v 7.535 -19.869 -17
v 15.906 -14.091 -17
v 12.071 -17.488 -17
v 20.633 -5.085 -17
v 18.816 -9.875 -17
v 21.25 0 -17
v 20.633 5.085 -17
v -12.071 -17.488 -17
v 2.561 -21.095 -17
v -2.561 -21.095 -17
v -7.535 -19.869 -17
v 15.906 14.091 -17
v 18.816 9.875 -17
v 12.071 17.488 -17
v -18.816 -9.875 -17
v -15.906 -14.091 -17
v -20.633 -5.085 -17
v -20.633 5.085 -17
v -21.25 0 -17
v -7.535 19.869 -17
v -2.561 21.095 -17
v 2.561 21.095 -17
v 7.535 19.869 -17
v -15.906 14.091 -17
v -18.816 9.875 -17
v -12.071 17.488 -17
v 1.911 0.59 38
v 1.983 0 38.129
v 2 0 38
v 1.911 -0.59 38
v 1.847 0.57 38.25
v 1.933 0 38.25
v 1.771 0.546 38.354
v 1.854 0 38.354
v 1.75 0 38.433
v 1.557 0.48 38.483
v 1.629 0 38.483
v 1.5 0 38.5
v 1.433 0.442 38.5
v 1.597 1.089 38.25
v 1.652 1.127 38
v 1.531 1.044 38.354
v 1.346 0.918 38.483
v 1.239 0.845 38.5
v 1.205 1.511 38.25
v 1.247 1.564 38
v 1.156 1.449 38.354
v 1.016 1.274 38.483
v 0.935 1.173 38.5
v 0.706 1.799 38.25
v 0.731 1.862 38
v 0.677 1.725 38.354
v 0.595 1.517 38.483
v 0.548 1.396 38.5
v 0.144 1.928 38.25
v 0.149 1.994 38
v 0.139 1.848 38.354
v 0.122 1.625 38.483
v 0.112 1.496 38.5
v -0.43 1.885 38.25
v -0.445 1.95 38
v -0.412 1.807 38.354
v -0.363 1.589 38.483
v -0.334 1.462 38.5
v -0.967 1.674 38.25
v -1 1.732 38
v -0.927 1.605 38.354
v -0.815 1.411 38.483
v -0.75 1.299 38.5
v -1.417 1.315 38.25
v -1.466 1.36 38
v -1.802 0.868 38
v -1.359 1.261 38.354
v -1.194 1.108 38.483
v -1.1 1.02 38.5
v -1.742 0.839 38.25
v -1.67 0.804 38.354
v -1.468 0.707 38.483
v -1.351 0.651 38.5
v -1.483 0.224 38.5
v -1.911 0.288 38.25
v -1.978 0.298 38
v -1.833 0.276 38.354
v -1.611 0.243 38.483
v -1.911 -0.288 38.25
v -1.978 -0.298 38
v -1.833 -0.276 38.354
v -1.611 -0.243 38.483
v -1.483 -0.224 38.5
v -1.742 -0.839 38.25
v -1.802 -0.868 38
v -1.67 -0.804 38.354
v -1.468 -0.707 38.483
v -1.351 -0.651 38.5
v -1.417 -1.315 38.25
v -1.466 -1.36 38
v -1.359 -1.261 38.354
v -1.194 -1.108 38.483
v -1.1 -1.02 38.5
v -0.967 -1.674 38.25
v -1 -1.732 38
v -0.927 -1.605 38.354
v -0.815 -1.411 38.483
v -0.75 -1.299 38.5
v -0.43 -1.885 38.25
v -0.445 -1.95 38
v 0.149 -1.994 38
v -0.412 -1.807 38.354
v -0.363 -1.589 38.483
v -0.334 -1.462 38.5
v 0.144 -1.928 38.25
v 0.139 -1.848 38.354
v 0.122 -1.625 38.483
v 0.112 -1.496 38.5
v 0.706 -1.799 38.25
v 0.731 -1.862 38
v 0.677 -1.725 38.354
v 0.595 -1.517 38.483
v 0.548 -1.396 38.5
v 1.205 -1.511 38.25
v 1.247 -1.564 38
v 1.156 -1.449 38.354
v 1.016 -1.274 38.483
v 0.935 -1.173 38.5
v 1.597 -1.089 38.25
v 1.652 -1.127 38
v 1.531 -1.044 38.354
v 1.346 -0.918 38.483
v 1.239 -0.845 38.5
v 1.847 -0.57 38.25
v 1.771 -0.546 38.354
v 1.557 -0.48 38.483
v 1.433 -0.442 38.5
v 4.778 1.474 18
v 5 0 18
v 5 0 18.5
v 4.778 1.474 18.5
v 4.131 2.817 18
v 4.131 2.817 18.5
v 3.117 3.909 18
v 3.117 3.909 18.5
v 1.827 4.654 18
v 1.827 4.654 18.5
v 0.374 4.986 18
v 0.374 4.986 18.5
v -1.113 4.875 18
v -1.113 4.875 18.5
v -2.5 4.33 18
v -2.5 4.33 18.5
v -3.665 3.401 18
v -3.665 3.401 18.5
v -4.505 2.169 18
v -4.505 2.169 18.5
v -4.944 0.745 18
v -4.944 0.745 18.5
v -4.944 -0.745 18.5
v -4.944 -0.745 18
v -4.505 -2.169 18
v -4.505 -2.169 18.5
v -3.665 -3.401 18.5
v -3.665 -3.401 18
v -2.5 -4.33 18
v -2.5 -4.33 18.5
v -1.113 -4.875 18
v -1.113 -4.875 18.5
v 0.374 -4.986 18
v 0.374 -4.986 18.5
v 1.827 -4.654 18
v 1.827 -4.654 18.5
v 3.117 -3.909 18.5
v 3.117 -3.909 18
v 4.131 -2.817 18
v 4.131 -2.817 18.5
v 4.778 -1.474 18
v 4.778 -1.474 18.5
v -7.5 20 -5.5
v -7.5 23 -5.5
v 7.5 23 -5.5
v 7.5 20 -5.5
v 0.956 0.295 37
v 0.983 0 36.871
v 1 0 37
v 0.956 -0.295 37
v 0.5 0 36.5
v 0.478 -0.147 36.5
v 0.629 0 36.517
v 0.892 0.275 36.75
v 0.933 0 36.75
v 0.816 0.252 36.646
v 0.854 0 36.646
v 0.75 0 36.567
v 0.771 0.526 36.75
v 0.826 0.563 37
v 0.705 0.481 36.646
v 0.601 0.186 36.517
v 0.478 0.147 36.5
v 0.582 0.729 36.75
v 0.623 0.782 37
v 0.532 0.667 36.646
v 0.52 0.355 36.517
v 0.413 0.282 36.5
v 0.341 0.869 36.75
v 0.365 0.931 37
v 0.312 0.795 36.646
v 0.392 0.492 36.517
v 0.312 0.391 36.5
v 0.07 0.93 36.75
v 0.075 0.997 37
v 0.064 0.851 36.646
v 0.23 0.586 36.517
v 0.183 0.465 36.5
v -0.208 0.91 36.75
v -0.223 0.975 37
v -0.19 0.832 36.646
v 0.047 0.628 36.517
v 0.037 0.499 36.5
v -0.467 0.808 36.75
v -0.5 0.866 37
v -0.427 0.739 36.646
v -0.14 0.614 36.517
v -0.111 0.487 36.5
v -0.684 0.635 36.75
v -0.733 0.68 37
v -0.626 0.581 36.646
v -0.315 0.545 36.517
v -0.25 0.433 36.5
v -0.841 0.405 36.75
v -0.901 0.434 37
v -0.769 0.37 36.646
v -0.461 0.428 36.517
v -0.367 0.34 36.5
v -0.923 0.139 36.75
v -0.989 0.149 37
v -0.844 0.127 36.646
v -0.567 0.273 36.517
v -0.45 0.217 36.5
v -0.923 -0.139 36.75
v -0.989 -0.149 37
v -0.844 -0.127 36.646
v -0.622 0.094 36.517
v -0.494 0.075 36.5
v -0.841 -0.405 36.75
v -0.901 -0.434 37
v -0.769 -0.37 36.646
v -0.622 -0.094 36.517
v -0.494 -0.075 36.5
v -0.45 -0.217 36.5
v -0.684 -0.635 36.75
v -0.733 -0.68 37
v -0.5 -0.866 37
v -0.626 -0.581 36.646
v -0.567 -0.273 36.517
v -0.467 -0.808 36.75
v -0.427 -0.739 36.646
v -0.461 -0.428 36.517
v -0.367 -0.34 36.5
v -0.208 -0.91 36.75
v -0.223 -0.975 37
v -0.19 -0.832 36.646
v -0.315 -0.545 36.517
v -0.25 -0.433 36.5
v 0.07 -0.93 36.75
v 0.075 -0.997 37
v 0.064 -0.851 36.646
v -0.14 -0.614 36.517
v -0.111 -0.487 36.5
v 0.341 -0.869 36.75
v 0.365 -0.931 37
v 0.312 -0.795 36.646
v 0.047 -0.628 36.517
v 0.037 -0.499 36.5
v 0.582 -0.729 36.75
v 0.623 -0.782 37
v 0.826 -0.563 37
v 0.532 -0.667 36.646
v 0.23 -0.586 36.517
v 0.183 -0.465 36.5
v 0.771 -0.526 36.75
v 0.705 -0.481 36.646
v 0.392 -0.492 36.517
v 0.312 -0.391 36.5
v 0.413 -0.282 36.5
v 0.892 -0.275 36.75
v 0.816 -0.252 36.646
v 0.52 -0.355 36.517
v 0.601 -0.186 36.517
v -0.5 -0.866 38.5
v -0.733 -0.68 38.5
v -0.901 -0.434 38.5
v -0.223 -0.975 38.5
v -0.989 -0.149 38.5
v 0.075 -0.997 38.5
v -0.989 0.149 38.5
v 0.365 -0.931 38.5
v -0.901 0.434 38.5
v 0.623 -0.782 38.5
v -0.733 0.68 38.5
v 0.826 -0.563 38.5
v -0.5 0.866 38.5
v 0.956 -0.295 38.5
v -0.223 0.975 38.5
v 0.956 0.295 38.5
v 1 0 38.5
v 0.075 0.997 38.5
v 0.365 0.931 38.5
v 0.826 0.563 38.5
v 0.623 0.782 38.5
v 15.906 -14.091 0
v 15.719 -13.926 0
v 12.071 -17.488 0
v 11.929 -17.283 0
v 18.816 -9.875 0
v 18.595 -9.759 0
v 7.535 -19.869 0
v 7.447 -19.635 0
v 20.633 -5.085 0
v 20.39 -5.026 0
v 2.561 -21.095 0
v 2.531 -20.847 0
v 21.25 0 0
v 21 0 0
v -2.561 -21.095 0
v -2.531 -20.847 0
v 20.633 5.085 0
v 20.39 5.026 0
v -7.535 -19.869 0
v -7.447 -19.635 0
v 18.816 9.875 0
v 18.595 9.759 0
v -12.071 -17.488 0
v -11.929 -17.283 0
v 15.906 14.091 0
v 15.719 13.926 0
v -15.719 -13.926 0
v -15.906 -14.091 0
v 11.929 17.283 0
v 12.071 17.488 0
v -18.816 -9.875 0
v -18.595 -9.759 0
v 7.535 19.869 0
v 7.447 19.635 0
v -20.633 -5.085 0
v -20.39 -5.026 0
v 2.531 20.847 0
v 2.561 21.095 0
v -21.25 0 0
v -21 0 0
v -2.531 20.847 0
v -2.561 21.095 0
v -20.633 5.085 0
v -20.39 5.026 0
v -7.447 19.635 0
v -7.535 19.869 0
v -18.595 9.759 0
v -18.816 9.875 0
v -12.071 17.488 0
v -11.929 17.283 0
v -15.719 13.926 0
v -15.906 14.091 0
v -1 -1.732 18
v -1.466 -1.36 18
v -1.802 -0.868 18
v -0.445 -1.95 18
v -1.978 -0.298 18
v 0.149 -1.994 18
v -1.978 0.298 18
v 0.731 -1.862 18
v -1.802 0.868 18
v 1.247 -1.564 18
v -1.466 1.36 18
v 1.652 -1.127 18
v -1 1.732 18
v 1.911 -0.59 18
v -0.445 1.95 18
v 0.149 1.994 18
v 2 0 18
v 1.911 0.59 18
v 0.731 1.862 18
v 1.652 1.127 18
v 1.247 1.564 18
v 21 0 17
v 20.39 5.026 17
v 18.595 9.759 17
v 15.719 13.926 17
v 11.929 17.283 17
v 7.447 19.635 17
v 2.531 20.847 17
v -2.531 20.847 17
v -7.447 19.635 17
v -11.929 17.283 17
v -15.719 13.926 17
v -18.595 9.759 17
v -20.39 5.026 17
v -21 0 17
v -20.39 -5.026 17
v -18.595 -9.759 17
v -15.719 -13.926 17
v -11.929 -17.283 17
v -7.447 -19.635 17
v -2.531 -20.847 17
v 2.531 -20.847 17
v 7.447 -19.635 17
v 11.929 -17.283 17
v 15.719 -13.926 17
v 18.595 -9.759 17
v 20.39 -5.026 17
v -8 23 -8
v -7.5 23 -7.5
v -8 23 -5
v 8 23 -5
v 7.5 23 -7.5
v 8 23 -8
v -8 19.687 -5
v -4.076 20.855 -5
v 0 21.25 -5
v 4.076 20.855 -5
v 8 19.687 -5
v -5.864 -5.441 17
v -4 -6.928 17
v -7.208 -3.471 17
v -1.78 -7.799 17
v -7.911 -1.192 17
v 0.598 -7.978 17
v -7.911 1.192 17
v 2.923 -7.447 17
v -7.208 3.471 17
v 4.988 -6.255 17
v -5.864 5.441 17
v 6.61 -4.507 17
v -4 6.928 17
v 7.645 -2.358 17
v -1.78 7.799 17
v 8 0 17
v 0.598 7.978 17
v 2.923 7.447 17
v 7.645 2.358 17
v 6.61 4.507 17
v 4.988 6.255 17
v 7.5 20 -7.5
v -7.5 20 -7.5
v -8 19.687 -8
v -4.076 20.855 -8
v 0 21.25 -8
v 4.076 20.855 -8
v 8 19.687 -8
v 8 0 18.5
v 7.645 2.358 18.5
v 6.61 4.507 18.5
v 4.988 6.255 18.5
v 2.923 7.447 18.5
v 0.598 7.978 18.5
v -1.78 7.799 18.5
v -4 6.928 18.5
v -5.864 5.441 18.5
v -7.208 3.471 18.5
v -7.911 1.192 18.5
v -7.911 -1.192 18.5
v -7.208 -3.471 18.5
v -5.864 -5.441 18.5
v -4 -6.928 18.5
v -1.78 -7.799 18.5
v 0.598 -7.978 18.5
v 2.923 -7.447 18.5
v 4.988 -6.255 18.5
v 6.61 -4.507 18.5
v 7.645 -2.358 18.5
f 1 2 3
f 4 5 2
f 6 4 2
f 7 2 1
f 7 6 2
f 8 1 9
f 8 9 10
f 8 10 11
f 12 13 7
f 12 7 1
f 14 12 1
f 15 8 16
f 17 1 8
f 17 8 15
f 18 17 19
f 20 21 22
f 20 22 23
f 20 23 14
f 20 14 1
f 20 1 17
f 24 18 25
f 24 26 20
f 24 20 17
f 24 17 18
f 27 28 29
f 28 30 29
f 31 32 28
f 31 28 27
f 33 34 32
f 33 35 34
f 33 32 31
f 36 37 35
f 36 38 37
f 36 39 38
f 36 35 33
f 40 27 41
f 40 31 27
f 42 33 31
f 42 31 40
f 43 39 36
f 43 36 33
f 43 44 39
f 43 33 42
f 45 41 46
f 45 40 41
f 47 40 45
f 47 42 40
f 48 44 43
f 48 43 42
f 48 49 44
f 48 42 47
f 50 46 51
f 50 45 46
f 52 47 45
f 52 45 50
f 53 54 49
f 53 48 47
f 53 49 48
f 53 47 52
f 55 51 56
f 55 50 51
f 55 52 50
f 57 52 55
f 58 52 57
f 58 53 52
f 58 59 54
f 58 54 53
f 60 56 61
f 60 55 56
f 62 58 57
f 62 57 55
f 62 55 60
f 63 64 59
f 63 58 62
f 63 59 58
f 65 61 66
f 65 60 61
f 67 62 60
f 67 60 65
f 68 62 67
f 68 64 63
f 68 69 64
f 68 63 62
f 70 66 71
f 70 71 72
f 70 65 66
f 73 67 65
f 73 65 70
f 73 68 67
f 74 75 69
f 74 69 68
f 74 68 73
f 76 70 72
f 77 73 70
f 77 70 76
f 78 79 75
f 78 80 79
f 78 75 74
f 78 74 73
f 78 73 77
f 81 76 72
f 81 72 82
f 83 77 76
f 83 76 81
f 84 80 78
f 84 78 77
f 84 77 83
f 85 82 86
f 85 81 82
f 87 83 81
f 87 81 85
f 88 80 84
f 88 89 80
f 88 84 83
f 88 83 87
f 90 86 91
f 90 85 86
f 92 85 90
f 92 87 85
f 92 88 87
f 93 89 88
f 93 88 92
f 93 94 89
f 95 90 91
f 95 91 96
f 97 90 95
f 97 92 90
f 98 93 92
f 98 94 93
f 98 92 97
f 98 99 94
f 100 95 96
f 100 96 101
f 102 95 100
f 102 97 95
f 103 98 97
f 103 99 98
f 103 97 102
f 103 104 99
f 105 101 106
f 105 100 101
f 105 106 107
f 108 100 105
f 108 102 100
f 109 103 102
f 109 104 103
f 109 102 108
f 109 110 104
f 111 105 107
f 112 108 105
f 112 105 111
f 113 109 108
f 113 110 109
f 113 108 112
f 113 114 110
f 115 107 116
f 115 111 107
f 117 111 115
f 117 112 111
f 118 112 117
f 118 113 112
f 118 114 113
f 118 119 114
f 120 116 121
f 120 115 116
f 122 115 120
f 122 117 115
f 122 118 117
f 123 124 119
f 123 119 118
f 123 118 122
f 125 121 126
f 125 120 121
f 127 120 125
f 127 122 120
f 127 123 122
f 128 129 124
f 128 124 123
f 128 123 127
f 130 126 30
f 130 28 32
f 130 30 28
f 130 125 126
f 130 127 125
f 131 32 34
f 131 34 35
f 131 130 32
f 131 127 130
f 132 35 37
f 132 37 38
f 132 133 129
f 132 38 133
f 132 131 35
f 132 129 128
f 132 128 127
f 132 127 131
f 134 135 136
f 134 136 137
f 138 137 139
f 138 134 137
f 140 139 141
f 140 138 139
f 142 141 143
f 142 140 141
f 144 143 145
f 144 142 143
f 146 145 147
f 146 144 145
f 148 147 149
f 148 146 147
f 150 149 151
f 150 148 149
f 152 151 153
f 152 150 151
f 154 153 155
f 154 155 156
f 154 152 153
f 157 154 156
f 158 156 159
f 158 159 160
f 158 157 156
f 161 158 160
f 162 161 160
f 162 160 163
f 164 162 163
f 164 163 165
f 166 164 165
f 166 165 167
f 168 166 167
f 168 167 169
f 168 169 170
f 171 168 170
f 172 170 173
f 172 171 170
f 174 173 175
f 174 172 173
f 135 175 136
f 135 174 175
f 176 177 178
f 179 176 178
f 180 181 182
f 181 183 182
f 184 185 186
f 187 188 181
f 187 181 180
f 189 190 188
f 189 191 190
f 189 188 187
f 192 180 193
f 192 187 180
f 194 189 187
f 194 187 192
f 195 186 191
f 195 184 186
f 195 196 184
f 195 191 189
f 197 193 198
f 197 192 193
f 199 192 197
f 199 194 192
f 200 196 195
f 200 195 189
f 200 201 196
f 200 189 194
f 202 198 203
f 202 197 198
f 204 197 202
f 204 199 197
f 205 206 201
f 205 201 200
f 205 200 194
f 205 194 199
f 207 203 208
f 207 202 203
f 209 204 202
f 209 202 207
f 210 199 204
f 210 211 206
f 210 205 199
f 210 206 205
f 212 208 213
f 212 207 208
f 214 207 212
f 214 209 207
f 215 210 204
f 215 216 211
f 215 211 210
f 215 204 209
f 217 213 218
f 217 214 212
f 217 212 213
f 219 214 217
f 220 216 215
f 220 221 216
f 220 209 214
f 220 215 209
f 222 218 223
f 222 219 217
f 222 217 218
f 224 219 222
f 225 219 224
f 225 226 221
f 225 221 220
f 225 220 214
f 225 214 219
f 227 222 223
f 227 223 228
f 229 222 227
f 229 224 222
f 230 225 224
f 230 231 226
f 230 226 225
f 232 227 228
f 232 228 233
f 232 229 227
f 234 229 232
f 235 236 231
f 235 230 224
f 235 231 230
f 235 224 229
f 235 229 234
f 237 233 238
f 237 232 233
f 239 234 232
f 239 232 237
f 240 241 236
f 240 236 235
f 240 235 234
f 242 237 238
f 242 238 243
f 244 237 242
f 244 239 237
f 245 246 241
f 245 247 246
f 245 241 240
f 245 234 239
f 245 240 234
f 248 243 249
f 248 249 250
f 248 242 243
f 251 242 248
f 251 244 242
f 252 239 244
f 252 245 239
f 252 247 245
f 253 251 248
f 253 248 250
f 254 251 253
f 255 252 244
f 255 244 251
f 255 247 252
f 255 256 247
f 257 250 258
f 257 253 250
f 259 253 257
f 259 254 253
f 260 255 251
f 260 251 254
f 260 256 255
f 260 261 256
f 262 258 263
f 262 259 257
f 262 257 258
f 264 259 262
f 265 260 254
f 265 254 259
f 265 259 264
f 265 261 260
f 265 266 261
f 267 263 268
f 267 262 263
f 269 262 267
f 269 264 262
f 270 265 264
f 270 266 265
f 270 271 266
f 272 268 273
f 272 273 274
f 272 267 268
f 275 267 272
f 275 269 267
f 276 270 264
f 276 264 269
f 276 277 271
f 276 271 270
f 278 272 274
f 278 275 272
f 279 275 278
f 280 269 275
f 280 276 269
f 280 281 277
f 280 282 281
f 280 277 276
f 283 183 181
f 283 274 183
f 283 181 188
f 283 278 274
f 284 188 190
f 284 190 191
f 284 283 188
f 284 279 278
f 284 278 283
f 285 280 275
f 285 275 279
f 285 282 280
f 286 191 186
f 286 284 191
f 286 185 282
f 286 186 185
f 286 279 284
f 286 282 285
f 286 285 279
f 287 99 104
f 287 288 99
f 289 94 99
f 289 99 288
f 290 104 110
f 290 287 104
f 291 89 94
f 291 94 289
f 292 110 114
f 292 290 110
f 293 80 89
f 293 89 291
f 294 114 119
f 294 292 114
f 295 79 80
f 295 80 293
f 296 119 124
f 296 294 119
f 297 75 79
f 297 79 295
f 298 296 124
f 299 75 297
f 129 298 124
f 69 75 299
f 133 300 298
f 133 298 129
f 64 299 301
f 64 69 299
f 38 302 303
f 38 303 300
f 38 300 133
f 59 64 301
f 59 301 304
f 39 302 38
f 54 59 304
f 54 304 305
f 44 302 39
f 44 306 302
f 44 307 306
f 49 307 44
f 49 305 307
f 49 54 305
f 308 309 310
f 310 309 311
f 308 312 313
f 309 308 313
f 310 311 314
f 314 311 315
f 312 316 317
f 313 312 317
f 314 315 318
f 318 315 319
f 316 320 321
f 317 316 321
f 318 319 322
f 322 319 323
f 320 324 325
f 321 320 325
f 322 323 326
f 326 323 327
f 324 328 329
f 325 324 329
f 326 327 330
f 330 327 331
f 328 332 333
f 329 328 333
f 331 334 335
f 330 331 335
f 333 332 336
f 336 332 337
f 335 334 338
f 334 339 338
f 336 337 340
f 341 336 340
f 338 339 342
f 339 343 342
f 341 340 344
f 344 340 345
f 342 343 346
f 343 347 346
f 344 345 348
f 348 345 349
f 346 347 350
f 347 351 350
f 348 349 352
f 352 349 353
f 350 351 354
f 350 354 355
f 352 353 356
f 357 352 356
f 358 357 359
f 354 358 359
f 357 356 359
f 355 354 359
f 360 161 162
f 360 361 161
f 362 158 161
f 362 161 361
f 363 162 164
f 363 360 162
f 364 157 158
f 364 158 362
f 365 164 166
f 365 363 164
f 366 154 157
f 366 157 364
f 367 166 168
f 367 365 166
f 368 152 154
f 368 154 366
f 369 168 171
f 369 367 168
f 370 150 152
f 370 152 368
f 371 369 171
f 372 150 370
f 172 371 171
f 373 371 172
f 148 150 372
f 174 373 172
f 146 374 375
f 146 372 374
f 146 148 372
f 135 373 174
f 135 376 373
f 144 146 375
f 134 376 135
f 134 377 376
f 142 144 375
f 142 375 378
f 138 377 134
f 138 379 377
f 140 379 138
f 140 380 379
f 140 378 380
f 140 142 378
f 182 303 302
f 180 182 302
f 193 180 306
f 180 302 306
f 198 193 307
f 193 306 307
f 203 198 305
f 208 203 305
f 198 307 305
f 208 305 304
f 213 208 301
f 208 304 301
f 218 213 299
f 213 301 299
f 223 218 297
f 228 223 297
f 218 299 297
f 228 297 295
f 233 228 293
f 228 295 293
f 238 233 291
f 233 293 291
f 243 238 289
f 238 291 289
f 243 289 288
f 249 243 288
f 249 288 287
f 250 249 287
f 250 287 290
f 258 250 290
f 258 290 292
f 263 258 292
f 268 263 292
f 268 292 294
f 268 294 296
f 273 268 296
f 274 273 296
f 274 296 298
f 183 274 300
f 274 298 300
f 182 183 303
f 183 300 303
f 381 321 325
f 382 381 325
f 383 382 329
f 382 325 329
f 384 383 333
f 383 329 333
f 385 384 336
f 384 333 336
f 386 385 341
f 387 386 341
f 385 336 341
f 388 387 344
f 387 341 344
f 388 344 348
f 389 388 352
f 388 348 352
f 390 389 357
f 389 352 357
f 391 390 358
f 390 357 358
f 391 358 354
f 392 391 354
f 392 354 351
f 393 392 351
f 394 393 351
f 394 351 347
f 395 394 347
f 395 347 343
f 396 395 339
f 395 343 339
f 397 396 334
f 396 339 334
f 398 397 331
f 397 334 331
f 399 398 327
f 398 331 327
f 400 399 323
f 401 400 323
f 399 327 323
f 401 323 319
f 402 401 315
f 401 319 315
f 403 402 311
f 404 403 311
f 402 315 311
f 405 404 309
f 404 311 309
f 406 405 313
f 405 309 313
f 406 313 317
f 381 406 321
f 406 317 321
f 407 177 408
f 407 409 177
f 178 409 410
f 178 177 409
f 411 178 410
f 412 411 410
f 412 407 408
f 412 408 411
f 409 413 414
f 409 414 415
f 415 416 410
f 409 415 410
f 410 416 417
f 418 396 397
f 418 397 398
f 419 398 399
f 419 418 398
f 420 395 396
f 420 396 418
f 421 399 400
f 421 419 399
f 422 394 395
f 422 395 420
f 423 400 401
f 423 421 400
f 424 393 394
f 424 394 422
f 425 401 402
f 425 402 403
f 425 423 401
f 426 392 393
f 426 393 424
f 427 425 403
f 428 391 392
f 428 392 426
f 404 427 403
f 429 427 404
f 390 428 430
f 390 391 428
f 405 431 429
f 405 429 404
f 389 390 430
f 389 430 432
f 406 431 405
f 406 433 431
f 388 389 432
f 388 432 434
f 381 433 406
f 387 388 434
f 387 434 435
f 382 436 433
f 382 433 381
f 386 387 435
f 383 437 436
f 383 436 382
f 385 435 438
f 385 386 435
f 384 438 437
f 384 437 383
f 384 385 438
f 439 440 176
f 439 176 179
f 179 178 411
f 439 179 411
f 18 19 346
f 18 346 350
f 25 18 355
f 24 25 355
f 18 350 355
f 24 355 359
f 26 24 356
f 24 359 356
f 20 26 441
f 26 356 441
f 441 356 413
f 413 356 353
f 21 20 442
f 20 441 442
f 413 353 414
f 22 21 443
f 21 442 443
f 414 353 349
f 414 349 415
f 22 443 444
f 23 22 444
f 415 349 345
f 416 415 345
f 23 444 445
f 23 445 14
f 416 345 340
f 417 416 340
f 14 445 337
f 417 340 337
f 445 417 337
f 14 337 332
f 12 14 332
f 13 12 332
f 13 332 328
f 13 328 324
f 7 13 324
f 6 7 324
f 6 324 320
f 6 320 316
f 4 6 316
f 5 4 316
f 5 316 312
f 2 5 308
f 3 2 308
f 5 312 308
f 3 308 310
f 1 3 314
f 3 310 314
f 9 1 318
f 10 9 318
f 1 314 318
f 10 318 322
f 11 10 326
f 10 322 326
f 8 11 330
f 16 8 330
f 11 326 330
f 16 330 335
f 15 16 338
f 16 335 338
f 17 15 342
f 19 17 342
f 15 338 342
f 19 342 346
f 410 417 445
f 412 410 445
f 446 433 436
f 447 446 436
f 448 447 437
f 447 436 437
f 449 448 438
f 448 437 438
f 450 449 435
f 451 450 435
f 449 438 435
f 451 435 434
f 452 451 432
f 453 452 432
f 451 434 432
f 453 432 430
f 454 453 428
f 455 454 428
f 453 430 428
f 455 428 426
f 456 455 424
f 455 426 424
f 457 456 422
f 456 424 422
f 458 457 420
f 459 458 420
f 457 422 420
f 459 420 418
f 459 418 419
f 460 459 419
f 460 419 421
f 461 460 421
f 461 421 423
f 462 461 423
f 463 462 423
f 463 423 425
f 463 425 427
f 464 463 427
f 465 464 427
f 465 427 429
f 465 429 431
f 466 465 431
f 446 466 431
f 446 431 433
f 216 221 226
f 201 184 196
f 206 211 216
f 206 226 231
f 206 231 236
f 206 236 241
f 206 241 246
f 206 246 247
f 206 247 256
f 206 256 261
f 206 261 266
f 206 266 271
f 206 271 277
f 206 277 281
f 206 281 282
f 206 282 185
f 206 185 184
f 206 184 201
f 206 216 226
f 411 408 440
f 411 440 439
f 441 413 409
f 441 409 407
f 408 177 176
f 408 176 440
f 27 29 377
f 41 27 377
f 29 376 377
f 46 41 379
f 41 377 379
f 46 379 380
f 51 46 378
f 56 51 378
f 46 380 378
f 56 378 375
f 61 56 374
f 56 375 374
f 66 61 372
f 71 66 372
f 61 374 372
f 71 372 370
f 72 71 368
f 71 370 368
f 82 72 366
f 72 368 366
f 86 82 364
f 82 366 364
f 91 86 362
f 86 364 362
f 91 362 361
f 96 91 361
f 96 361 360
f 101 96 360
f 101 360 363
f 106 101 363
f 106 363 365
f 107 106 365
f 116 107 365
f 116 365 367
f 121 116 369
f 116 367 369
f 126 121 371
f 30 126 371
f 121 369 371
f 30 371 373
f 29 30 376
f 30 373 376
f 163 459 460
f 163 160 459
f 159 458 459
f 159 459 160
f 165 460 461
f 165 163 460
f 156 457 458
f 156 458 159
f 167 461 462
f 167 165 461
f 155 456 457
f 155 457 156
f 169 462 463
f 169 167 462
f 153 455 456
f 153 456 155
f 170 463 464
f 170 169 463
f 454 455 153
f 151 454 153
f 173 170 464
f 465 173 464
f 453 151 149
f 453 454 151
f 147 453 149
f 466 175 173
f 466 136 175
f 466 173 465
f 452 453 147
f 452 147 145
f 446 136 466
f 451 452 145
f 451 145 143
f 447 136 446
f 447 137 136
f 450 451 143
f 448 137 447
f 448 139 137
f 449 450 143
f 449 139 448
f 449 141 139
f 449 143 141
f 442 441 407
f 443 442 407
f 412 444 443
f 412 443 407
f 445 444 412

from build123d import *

# Parameters (mm, degrees)
SKETCH_1_R          = 21
EXTRUDE_1_DEPTH     = 17
SKETCH_2_R          = 8
EXTRUDE_2_DEPTH     = 1.5
SKETCH_3_R          = 3
EXTRUDE_3_DEPTH     = 20.5
CHAMFER_1_SIZE      = 1
THREAD_1_PITCH      = 1
CUT_EXTRUDE_1_DEPTH = 1
EXTRUDE1_DEPTH      = 50.020403995
EXTRUDE1_DEPTH_BACK = 50.020403995
SKETCH1_W           = 6
SKETCH1_H           = 20.5
SKETCH2_R           = 2
EXTRUDE2_DEPTH      = 20
FILLET1_R           = 0.5
SKETCH3_R           = 1
EXTRUDE3_DEPTH      = 2
FILLET2_R           = 0.5
EXTRUDE5_START      = -0.5
SKETCH4_R           = 5
SKETCH4_R_2         = 2
EXTRUDE5_DEPTH      = 0.5
SKETCH5_R           = 21.25
EXTRUDE7_DEPTH      = 17
SKETCH6_W           = 16
SKETCH6_H           = 3
EXTRUDE8_DEPTH      = 8
SKETCH7_W           = 15
SKETCH7_H           = 2
EXTRUDE9_DEPTH      = 3


with BuildPart() as part:
    # Sketch 1 → 보스-돌출1 (new body)
    with BuildSketch(Plane.XY):
        Circle(SKETCH_1_R)
    extrude(amount=EXTRUDE_1_DEPTH)

    # 스케치2 → 보스-돌출2 (add)
    with BuildSketch(Plane.XY.offset(17)):
        Circle(SKETCH_2_R)
    extrude(amount=EXTRUDE_2_DEPTH)

    # 스케치3 → 보스-돌출3 (add)
    with BuildSketch(Plane.XY.offset(18.5)):
        Circle(SKETCH_3_R)
    extrude(amount=EXTRUDE_3_DEPTH)

    # 모따기1
    chamfer_1_edges = [part.edges().sort_by_distance(p)[0] for p in [
        (-3, 0, 39),
    ]]
    chamfer(chamfer_1_edges, length=CHAMFER_1_SIZE)

    # 나사산1: the profile of Sketch 1 2 profile screwed along a right-hand helix of 8 turns, 8 arcs to a turn; built about Z, then put on its axis
    thread_1_z = Axis((0, 0, 0), (0, 0, 1))
    thread_1_corners = [(3.0003, 0, -0.000173205), (3.0003, 0, 0.875173202), (2.458734125, 0, 0.562499999), (2.458734125, 0, 0.312499999)]
    with BuildLine(mode=Mode.PRIVATE) as thread_1_profile:
        Line(thread_1_corners[0], thread_1_corners[1])
        Line(thread_1_corners[1], thread_1_corners[2])
        Line(thread_1_corners[2], thread_1_corners[3])
        Line(thread_1_corners[3], thread_1_corners[0])
    thread_1_cap = Face(thread_1_profile.wire())
    thread_1_turn_angles = [0, 22.5, 45, 67.5, 90, 112.5, 135, 157.5, 180, 202.5, 225, 247.5, 270, 292.5, 315, 337.5, 360]
    thread_1_turn_weights = [1, 0.9238795325112867, 1, 0.9238795325112867, 1, 0.9238795325112867, 1, 0.9238795325112867, 1, 0.9238795325112867, 1, 0.9238795325112867, 1, 0.9238795325112867, 1, 0.9238795325112867, 1]
    thread_1_turn_rails = [Edge.make_bspline([Vector(p[0], p[1], 0).rotate(thread_1_z, thread_1_turn_angles[k]) / thread_1_turn_weights[k] + Vector(0, 0, p[2] + THREAD_1_PITCH * thread_1_turn_angles[k] / 360) for k in range(17)], [0, 0, 0, 1, 1, 2, 2, 3, 3, 4, 4, 5, 5, 6, 6, 7, 7, 8, 8, 8], 2, thread_1_turn_weights) for p in thread_1_corners]
    thread_1_turn_sides = [Face.make_surface_from_curves(thread_1_turn_rails[p[0]], thread_1_turn_rails[p[1]]) for p in [(0, 1), (1, 2), (2, 3), (3, 0)]]
    thread_1 = Plane(origin=(0, 0, 38), x_dir=(-1, 0, 0), z_dir=(0, 0, -1)) * Solid(Shell([*[p.moved(Location((0, 0, THREAD_1_PITCH * i))) for i in range(8) for p in thread_1_turn_sides], thread_1_cap, thread_1_cap.rotate(thread_1_z, 2880).moved(Location((0, 0, THREAD_1_PITCH * 2880 / 360)))]))
    add(thread_1, mode=Mode.SUBTRACT)

    # 스케치8 → 컷-돌출1 (cut)
    with BuildSketch(Plane(origin=(0, 3, 0), x_dir=(1, 0, 0), z_dir=(0, 1, 0))):
        Polygon((3, -39), (3, -38), (3, -37.5), (3, -29.625000003), (3, -27), (-3, -27), (-3, -29.125000003), (-3, -30), (-3, -37.125000003), (-3, -38), (-3, -39), (-2, -39), (2, -39), align=None)
    extrude(amount=-CUT_EXTRUDE_1_DEPTH, mode=Mode.SUBTRACT)

    # Sketch1 → Extrude1 (cut, two sides: drawn at the far end of the back side and taken through both)
    with BuildSketch(Plane(origin=(0, 0, 0), x_dir=(1, 0, 0), z_dir=(0, 1, 0)).offset(-EXTRUDE1_DEPTH_BACK)):
        with Locations((0, -28.75)):
            Rectangle(SKETCH1_W, SKETCH1_H)
    extrude(amount=EXTRUDE1_DEPTH + EXTRUDE1_DEPTH_BACK, mode=Mode.SUBTRACT)

    # Sketch2 → Extrude2 (add)
    with BuildSketch(Plane.XY.offset(18.5)):
        Circle(SKETCH2_R)
    extrude(amount=EXTRUDE2_DEPTH)

    # Fillet1
    fillet1_edges = [part.edges().sort_by_distance(p)[0] for p in [
        (-2, 0, 38.5),
    ]]
    fillet(fillet1_edges, radius=FILLET1_R)

    # Sketch3 → Extrude3 (cut)
    with BuildSketch(Plane.XY.offset(38.5)):
        Circle(SKETCH3_R)
    extrude(amount=-EXTRUDE3_DEPTH, mode=Mode.SUBTRACT)

    # Fillet2
    fillet2_edges = [part.edges().sort_by_distance(p)[0] for p in [
        (-1, 0, 36.5),
    ]]
    fillet(fillet2_edges, radius=FILLET2_R)

    # Sketch4 → Extrude5 (cut)
    with BuildSketch(Plane.XY.offset(18.5).offset(EXTRUDE5_START)):
        Circle(SKETCH4_R)
        Circle(SKETCH4_R_2, mode=Mode.SUBTRACT)
    extrude(amount=EXTRUDE5_DEPTH, mode=Mode.SUBTRACT)

    # Sketch5 → Extrude7 (add)
    with BuildSketch(Plane(origin=(0, 0, 0), x_dir=(-1, 0, 0), z_dir=(0, 0, -1))):
        Circle(SKETCH5_R)
    extrude(amount=EXTRUDE7_DEPTH)

    # Sketch6 → Extrude8 (add)
    with BuildSketch(Plane(origin=(0, 15, 0), x_dir=(1, 0, 0), z_dir=(0, 1, 0))):
        with Locations((0, 6.5)):
            Rectangle(SKETCH6_W, SKETCH6_H)
    extrude(amount=EXTRUDE8_DEPTH)

    # Sketch7 → Extrude9 (cut)
    with BuildSketch(Plane(origin=(0, 23, 0), x_dir=(1, 0, 0), z_dir=(0, 1, 0))):
        with Locations((0, 6.5)):
            Rectangle(SKETCH7_W, SKETCH7_H)
    extrude(amount=-EXTRUDE9_DEPTH, mode=Mode.SUBTRACT)


solid = part.part
